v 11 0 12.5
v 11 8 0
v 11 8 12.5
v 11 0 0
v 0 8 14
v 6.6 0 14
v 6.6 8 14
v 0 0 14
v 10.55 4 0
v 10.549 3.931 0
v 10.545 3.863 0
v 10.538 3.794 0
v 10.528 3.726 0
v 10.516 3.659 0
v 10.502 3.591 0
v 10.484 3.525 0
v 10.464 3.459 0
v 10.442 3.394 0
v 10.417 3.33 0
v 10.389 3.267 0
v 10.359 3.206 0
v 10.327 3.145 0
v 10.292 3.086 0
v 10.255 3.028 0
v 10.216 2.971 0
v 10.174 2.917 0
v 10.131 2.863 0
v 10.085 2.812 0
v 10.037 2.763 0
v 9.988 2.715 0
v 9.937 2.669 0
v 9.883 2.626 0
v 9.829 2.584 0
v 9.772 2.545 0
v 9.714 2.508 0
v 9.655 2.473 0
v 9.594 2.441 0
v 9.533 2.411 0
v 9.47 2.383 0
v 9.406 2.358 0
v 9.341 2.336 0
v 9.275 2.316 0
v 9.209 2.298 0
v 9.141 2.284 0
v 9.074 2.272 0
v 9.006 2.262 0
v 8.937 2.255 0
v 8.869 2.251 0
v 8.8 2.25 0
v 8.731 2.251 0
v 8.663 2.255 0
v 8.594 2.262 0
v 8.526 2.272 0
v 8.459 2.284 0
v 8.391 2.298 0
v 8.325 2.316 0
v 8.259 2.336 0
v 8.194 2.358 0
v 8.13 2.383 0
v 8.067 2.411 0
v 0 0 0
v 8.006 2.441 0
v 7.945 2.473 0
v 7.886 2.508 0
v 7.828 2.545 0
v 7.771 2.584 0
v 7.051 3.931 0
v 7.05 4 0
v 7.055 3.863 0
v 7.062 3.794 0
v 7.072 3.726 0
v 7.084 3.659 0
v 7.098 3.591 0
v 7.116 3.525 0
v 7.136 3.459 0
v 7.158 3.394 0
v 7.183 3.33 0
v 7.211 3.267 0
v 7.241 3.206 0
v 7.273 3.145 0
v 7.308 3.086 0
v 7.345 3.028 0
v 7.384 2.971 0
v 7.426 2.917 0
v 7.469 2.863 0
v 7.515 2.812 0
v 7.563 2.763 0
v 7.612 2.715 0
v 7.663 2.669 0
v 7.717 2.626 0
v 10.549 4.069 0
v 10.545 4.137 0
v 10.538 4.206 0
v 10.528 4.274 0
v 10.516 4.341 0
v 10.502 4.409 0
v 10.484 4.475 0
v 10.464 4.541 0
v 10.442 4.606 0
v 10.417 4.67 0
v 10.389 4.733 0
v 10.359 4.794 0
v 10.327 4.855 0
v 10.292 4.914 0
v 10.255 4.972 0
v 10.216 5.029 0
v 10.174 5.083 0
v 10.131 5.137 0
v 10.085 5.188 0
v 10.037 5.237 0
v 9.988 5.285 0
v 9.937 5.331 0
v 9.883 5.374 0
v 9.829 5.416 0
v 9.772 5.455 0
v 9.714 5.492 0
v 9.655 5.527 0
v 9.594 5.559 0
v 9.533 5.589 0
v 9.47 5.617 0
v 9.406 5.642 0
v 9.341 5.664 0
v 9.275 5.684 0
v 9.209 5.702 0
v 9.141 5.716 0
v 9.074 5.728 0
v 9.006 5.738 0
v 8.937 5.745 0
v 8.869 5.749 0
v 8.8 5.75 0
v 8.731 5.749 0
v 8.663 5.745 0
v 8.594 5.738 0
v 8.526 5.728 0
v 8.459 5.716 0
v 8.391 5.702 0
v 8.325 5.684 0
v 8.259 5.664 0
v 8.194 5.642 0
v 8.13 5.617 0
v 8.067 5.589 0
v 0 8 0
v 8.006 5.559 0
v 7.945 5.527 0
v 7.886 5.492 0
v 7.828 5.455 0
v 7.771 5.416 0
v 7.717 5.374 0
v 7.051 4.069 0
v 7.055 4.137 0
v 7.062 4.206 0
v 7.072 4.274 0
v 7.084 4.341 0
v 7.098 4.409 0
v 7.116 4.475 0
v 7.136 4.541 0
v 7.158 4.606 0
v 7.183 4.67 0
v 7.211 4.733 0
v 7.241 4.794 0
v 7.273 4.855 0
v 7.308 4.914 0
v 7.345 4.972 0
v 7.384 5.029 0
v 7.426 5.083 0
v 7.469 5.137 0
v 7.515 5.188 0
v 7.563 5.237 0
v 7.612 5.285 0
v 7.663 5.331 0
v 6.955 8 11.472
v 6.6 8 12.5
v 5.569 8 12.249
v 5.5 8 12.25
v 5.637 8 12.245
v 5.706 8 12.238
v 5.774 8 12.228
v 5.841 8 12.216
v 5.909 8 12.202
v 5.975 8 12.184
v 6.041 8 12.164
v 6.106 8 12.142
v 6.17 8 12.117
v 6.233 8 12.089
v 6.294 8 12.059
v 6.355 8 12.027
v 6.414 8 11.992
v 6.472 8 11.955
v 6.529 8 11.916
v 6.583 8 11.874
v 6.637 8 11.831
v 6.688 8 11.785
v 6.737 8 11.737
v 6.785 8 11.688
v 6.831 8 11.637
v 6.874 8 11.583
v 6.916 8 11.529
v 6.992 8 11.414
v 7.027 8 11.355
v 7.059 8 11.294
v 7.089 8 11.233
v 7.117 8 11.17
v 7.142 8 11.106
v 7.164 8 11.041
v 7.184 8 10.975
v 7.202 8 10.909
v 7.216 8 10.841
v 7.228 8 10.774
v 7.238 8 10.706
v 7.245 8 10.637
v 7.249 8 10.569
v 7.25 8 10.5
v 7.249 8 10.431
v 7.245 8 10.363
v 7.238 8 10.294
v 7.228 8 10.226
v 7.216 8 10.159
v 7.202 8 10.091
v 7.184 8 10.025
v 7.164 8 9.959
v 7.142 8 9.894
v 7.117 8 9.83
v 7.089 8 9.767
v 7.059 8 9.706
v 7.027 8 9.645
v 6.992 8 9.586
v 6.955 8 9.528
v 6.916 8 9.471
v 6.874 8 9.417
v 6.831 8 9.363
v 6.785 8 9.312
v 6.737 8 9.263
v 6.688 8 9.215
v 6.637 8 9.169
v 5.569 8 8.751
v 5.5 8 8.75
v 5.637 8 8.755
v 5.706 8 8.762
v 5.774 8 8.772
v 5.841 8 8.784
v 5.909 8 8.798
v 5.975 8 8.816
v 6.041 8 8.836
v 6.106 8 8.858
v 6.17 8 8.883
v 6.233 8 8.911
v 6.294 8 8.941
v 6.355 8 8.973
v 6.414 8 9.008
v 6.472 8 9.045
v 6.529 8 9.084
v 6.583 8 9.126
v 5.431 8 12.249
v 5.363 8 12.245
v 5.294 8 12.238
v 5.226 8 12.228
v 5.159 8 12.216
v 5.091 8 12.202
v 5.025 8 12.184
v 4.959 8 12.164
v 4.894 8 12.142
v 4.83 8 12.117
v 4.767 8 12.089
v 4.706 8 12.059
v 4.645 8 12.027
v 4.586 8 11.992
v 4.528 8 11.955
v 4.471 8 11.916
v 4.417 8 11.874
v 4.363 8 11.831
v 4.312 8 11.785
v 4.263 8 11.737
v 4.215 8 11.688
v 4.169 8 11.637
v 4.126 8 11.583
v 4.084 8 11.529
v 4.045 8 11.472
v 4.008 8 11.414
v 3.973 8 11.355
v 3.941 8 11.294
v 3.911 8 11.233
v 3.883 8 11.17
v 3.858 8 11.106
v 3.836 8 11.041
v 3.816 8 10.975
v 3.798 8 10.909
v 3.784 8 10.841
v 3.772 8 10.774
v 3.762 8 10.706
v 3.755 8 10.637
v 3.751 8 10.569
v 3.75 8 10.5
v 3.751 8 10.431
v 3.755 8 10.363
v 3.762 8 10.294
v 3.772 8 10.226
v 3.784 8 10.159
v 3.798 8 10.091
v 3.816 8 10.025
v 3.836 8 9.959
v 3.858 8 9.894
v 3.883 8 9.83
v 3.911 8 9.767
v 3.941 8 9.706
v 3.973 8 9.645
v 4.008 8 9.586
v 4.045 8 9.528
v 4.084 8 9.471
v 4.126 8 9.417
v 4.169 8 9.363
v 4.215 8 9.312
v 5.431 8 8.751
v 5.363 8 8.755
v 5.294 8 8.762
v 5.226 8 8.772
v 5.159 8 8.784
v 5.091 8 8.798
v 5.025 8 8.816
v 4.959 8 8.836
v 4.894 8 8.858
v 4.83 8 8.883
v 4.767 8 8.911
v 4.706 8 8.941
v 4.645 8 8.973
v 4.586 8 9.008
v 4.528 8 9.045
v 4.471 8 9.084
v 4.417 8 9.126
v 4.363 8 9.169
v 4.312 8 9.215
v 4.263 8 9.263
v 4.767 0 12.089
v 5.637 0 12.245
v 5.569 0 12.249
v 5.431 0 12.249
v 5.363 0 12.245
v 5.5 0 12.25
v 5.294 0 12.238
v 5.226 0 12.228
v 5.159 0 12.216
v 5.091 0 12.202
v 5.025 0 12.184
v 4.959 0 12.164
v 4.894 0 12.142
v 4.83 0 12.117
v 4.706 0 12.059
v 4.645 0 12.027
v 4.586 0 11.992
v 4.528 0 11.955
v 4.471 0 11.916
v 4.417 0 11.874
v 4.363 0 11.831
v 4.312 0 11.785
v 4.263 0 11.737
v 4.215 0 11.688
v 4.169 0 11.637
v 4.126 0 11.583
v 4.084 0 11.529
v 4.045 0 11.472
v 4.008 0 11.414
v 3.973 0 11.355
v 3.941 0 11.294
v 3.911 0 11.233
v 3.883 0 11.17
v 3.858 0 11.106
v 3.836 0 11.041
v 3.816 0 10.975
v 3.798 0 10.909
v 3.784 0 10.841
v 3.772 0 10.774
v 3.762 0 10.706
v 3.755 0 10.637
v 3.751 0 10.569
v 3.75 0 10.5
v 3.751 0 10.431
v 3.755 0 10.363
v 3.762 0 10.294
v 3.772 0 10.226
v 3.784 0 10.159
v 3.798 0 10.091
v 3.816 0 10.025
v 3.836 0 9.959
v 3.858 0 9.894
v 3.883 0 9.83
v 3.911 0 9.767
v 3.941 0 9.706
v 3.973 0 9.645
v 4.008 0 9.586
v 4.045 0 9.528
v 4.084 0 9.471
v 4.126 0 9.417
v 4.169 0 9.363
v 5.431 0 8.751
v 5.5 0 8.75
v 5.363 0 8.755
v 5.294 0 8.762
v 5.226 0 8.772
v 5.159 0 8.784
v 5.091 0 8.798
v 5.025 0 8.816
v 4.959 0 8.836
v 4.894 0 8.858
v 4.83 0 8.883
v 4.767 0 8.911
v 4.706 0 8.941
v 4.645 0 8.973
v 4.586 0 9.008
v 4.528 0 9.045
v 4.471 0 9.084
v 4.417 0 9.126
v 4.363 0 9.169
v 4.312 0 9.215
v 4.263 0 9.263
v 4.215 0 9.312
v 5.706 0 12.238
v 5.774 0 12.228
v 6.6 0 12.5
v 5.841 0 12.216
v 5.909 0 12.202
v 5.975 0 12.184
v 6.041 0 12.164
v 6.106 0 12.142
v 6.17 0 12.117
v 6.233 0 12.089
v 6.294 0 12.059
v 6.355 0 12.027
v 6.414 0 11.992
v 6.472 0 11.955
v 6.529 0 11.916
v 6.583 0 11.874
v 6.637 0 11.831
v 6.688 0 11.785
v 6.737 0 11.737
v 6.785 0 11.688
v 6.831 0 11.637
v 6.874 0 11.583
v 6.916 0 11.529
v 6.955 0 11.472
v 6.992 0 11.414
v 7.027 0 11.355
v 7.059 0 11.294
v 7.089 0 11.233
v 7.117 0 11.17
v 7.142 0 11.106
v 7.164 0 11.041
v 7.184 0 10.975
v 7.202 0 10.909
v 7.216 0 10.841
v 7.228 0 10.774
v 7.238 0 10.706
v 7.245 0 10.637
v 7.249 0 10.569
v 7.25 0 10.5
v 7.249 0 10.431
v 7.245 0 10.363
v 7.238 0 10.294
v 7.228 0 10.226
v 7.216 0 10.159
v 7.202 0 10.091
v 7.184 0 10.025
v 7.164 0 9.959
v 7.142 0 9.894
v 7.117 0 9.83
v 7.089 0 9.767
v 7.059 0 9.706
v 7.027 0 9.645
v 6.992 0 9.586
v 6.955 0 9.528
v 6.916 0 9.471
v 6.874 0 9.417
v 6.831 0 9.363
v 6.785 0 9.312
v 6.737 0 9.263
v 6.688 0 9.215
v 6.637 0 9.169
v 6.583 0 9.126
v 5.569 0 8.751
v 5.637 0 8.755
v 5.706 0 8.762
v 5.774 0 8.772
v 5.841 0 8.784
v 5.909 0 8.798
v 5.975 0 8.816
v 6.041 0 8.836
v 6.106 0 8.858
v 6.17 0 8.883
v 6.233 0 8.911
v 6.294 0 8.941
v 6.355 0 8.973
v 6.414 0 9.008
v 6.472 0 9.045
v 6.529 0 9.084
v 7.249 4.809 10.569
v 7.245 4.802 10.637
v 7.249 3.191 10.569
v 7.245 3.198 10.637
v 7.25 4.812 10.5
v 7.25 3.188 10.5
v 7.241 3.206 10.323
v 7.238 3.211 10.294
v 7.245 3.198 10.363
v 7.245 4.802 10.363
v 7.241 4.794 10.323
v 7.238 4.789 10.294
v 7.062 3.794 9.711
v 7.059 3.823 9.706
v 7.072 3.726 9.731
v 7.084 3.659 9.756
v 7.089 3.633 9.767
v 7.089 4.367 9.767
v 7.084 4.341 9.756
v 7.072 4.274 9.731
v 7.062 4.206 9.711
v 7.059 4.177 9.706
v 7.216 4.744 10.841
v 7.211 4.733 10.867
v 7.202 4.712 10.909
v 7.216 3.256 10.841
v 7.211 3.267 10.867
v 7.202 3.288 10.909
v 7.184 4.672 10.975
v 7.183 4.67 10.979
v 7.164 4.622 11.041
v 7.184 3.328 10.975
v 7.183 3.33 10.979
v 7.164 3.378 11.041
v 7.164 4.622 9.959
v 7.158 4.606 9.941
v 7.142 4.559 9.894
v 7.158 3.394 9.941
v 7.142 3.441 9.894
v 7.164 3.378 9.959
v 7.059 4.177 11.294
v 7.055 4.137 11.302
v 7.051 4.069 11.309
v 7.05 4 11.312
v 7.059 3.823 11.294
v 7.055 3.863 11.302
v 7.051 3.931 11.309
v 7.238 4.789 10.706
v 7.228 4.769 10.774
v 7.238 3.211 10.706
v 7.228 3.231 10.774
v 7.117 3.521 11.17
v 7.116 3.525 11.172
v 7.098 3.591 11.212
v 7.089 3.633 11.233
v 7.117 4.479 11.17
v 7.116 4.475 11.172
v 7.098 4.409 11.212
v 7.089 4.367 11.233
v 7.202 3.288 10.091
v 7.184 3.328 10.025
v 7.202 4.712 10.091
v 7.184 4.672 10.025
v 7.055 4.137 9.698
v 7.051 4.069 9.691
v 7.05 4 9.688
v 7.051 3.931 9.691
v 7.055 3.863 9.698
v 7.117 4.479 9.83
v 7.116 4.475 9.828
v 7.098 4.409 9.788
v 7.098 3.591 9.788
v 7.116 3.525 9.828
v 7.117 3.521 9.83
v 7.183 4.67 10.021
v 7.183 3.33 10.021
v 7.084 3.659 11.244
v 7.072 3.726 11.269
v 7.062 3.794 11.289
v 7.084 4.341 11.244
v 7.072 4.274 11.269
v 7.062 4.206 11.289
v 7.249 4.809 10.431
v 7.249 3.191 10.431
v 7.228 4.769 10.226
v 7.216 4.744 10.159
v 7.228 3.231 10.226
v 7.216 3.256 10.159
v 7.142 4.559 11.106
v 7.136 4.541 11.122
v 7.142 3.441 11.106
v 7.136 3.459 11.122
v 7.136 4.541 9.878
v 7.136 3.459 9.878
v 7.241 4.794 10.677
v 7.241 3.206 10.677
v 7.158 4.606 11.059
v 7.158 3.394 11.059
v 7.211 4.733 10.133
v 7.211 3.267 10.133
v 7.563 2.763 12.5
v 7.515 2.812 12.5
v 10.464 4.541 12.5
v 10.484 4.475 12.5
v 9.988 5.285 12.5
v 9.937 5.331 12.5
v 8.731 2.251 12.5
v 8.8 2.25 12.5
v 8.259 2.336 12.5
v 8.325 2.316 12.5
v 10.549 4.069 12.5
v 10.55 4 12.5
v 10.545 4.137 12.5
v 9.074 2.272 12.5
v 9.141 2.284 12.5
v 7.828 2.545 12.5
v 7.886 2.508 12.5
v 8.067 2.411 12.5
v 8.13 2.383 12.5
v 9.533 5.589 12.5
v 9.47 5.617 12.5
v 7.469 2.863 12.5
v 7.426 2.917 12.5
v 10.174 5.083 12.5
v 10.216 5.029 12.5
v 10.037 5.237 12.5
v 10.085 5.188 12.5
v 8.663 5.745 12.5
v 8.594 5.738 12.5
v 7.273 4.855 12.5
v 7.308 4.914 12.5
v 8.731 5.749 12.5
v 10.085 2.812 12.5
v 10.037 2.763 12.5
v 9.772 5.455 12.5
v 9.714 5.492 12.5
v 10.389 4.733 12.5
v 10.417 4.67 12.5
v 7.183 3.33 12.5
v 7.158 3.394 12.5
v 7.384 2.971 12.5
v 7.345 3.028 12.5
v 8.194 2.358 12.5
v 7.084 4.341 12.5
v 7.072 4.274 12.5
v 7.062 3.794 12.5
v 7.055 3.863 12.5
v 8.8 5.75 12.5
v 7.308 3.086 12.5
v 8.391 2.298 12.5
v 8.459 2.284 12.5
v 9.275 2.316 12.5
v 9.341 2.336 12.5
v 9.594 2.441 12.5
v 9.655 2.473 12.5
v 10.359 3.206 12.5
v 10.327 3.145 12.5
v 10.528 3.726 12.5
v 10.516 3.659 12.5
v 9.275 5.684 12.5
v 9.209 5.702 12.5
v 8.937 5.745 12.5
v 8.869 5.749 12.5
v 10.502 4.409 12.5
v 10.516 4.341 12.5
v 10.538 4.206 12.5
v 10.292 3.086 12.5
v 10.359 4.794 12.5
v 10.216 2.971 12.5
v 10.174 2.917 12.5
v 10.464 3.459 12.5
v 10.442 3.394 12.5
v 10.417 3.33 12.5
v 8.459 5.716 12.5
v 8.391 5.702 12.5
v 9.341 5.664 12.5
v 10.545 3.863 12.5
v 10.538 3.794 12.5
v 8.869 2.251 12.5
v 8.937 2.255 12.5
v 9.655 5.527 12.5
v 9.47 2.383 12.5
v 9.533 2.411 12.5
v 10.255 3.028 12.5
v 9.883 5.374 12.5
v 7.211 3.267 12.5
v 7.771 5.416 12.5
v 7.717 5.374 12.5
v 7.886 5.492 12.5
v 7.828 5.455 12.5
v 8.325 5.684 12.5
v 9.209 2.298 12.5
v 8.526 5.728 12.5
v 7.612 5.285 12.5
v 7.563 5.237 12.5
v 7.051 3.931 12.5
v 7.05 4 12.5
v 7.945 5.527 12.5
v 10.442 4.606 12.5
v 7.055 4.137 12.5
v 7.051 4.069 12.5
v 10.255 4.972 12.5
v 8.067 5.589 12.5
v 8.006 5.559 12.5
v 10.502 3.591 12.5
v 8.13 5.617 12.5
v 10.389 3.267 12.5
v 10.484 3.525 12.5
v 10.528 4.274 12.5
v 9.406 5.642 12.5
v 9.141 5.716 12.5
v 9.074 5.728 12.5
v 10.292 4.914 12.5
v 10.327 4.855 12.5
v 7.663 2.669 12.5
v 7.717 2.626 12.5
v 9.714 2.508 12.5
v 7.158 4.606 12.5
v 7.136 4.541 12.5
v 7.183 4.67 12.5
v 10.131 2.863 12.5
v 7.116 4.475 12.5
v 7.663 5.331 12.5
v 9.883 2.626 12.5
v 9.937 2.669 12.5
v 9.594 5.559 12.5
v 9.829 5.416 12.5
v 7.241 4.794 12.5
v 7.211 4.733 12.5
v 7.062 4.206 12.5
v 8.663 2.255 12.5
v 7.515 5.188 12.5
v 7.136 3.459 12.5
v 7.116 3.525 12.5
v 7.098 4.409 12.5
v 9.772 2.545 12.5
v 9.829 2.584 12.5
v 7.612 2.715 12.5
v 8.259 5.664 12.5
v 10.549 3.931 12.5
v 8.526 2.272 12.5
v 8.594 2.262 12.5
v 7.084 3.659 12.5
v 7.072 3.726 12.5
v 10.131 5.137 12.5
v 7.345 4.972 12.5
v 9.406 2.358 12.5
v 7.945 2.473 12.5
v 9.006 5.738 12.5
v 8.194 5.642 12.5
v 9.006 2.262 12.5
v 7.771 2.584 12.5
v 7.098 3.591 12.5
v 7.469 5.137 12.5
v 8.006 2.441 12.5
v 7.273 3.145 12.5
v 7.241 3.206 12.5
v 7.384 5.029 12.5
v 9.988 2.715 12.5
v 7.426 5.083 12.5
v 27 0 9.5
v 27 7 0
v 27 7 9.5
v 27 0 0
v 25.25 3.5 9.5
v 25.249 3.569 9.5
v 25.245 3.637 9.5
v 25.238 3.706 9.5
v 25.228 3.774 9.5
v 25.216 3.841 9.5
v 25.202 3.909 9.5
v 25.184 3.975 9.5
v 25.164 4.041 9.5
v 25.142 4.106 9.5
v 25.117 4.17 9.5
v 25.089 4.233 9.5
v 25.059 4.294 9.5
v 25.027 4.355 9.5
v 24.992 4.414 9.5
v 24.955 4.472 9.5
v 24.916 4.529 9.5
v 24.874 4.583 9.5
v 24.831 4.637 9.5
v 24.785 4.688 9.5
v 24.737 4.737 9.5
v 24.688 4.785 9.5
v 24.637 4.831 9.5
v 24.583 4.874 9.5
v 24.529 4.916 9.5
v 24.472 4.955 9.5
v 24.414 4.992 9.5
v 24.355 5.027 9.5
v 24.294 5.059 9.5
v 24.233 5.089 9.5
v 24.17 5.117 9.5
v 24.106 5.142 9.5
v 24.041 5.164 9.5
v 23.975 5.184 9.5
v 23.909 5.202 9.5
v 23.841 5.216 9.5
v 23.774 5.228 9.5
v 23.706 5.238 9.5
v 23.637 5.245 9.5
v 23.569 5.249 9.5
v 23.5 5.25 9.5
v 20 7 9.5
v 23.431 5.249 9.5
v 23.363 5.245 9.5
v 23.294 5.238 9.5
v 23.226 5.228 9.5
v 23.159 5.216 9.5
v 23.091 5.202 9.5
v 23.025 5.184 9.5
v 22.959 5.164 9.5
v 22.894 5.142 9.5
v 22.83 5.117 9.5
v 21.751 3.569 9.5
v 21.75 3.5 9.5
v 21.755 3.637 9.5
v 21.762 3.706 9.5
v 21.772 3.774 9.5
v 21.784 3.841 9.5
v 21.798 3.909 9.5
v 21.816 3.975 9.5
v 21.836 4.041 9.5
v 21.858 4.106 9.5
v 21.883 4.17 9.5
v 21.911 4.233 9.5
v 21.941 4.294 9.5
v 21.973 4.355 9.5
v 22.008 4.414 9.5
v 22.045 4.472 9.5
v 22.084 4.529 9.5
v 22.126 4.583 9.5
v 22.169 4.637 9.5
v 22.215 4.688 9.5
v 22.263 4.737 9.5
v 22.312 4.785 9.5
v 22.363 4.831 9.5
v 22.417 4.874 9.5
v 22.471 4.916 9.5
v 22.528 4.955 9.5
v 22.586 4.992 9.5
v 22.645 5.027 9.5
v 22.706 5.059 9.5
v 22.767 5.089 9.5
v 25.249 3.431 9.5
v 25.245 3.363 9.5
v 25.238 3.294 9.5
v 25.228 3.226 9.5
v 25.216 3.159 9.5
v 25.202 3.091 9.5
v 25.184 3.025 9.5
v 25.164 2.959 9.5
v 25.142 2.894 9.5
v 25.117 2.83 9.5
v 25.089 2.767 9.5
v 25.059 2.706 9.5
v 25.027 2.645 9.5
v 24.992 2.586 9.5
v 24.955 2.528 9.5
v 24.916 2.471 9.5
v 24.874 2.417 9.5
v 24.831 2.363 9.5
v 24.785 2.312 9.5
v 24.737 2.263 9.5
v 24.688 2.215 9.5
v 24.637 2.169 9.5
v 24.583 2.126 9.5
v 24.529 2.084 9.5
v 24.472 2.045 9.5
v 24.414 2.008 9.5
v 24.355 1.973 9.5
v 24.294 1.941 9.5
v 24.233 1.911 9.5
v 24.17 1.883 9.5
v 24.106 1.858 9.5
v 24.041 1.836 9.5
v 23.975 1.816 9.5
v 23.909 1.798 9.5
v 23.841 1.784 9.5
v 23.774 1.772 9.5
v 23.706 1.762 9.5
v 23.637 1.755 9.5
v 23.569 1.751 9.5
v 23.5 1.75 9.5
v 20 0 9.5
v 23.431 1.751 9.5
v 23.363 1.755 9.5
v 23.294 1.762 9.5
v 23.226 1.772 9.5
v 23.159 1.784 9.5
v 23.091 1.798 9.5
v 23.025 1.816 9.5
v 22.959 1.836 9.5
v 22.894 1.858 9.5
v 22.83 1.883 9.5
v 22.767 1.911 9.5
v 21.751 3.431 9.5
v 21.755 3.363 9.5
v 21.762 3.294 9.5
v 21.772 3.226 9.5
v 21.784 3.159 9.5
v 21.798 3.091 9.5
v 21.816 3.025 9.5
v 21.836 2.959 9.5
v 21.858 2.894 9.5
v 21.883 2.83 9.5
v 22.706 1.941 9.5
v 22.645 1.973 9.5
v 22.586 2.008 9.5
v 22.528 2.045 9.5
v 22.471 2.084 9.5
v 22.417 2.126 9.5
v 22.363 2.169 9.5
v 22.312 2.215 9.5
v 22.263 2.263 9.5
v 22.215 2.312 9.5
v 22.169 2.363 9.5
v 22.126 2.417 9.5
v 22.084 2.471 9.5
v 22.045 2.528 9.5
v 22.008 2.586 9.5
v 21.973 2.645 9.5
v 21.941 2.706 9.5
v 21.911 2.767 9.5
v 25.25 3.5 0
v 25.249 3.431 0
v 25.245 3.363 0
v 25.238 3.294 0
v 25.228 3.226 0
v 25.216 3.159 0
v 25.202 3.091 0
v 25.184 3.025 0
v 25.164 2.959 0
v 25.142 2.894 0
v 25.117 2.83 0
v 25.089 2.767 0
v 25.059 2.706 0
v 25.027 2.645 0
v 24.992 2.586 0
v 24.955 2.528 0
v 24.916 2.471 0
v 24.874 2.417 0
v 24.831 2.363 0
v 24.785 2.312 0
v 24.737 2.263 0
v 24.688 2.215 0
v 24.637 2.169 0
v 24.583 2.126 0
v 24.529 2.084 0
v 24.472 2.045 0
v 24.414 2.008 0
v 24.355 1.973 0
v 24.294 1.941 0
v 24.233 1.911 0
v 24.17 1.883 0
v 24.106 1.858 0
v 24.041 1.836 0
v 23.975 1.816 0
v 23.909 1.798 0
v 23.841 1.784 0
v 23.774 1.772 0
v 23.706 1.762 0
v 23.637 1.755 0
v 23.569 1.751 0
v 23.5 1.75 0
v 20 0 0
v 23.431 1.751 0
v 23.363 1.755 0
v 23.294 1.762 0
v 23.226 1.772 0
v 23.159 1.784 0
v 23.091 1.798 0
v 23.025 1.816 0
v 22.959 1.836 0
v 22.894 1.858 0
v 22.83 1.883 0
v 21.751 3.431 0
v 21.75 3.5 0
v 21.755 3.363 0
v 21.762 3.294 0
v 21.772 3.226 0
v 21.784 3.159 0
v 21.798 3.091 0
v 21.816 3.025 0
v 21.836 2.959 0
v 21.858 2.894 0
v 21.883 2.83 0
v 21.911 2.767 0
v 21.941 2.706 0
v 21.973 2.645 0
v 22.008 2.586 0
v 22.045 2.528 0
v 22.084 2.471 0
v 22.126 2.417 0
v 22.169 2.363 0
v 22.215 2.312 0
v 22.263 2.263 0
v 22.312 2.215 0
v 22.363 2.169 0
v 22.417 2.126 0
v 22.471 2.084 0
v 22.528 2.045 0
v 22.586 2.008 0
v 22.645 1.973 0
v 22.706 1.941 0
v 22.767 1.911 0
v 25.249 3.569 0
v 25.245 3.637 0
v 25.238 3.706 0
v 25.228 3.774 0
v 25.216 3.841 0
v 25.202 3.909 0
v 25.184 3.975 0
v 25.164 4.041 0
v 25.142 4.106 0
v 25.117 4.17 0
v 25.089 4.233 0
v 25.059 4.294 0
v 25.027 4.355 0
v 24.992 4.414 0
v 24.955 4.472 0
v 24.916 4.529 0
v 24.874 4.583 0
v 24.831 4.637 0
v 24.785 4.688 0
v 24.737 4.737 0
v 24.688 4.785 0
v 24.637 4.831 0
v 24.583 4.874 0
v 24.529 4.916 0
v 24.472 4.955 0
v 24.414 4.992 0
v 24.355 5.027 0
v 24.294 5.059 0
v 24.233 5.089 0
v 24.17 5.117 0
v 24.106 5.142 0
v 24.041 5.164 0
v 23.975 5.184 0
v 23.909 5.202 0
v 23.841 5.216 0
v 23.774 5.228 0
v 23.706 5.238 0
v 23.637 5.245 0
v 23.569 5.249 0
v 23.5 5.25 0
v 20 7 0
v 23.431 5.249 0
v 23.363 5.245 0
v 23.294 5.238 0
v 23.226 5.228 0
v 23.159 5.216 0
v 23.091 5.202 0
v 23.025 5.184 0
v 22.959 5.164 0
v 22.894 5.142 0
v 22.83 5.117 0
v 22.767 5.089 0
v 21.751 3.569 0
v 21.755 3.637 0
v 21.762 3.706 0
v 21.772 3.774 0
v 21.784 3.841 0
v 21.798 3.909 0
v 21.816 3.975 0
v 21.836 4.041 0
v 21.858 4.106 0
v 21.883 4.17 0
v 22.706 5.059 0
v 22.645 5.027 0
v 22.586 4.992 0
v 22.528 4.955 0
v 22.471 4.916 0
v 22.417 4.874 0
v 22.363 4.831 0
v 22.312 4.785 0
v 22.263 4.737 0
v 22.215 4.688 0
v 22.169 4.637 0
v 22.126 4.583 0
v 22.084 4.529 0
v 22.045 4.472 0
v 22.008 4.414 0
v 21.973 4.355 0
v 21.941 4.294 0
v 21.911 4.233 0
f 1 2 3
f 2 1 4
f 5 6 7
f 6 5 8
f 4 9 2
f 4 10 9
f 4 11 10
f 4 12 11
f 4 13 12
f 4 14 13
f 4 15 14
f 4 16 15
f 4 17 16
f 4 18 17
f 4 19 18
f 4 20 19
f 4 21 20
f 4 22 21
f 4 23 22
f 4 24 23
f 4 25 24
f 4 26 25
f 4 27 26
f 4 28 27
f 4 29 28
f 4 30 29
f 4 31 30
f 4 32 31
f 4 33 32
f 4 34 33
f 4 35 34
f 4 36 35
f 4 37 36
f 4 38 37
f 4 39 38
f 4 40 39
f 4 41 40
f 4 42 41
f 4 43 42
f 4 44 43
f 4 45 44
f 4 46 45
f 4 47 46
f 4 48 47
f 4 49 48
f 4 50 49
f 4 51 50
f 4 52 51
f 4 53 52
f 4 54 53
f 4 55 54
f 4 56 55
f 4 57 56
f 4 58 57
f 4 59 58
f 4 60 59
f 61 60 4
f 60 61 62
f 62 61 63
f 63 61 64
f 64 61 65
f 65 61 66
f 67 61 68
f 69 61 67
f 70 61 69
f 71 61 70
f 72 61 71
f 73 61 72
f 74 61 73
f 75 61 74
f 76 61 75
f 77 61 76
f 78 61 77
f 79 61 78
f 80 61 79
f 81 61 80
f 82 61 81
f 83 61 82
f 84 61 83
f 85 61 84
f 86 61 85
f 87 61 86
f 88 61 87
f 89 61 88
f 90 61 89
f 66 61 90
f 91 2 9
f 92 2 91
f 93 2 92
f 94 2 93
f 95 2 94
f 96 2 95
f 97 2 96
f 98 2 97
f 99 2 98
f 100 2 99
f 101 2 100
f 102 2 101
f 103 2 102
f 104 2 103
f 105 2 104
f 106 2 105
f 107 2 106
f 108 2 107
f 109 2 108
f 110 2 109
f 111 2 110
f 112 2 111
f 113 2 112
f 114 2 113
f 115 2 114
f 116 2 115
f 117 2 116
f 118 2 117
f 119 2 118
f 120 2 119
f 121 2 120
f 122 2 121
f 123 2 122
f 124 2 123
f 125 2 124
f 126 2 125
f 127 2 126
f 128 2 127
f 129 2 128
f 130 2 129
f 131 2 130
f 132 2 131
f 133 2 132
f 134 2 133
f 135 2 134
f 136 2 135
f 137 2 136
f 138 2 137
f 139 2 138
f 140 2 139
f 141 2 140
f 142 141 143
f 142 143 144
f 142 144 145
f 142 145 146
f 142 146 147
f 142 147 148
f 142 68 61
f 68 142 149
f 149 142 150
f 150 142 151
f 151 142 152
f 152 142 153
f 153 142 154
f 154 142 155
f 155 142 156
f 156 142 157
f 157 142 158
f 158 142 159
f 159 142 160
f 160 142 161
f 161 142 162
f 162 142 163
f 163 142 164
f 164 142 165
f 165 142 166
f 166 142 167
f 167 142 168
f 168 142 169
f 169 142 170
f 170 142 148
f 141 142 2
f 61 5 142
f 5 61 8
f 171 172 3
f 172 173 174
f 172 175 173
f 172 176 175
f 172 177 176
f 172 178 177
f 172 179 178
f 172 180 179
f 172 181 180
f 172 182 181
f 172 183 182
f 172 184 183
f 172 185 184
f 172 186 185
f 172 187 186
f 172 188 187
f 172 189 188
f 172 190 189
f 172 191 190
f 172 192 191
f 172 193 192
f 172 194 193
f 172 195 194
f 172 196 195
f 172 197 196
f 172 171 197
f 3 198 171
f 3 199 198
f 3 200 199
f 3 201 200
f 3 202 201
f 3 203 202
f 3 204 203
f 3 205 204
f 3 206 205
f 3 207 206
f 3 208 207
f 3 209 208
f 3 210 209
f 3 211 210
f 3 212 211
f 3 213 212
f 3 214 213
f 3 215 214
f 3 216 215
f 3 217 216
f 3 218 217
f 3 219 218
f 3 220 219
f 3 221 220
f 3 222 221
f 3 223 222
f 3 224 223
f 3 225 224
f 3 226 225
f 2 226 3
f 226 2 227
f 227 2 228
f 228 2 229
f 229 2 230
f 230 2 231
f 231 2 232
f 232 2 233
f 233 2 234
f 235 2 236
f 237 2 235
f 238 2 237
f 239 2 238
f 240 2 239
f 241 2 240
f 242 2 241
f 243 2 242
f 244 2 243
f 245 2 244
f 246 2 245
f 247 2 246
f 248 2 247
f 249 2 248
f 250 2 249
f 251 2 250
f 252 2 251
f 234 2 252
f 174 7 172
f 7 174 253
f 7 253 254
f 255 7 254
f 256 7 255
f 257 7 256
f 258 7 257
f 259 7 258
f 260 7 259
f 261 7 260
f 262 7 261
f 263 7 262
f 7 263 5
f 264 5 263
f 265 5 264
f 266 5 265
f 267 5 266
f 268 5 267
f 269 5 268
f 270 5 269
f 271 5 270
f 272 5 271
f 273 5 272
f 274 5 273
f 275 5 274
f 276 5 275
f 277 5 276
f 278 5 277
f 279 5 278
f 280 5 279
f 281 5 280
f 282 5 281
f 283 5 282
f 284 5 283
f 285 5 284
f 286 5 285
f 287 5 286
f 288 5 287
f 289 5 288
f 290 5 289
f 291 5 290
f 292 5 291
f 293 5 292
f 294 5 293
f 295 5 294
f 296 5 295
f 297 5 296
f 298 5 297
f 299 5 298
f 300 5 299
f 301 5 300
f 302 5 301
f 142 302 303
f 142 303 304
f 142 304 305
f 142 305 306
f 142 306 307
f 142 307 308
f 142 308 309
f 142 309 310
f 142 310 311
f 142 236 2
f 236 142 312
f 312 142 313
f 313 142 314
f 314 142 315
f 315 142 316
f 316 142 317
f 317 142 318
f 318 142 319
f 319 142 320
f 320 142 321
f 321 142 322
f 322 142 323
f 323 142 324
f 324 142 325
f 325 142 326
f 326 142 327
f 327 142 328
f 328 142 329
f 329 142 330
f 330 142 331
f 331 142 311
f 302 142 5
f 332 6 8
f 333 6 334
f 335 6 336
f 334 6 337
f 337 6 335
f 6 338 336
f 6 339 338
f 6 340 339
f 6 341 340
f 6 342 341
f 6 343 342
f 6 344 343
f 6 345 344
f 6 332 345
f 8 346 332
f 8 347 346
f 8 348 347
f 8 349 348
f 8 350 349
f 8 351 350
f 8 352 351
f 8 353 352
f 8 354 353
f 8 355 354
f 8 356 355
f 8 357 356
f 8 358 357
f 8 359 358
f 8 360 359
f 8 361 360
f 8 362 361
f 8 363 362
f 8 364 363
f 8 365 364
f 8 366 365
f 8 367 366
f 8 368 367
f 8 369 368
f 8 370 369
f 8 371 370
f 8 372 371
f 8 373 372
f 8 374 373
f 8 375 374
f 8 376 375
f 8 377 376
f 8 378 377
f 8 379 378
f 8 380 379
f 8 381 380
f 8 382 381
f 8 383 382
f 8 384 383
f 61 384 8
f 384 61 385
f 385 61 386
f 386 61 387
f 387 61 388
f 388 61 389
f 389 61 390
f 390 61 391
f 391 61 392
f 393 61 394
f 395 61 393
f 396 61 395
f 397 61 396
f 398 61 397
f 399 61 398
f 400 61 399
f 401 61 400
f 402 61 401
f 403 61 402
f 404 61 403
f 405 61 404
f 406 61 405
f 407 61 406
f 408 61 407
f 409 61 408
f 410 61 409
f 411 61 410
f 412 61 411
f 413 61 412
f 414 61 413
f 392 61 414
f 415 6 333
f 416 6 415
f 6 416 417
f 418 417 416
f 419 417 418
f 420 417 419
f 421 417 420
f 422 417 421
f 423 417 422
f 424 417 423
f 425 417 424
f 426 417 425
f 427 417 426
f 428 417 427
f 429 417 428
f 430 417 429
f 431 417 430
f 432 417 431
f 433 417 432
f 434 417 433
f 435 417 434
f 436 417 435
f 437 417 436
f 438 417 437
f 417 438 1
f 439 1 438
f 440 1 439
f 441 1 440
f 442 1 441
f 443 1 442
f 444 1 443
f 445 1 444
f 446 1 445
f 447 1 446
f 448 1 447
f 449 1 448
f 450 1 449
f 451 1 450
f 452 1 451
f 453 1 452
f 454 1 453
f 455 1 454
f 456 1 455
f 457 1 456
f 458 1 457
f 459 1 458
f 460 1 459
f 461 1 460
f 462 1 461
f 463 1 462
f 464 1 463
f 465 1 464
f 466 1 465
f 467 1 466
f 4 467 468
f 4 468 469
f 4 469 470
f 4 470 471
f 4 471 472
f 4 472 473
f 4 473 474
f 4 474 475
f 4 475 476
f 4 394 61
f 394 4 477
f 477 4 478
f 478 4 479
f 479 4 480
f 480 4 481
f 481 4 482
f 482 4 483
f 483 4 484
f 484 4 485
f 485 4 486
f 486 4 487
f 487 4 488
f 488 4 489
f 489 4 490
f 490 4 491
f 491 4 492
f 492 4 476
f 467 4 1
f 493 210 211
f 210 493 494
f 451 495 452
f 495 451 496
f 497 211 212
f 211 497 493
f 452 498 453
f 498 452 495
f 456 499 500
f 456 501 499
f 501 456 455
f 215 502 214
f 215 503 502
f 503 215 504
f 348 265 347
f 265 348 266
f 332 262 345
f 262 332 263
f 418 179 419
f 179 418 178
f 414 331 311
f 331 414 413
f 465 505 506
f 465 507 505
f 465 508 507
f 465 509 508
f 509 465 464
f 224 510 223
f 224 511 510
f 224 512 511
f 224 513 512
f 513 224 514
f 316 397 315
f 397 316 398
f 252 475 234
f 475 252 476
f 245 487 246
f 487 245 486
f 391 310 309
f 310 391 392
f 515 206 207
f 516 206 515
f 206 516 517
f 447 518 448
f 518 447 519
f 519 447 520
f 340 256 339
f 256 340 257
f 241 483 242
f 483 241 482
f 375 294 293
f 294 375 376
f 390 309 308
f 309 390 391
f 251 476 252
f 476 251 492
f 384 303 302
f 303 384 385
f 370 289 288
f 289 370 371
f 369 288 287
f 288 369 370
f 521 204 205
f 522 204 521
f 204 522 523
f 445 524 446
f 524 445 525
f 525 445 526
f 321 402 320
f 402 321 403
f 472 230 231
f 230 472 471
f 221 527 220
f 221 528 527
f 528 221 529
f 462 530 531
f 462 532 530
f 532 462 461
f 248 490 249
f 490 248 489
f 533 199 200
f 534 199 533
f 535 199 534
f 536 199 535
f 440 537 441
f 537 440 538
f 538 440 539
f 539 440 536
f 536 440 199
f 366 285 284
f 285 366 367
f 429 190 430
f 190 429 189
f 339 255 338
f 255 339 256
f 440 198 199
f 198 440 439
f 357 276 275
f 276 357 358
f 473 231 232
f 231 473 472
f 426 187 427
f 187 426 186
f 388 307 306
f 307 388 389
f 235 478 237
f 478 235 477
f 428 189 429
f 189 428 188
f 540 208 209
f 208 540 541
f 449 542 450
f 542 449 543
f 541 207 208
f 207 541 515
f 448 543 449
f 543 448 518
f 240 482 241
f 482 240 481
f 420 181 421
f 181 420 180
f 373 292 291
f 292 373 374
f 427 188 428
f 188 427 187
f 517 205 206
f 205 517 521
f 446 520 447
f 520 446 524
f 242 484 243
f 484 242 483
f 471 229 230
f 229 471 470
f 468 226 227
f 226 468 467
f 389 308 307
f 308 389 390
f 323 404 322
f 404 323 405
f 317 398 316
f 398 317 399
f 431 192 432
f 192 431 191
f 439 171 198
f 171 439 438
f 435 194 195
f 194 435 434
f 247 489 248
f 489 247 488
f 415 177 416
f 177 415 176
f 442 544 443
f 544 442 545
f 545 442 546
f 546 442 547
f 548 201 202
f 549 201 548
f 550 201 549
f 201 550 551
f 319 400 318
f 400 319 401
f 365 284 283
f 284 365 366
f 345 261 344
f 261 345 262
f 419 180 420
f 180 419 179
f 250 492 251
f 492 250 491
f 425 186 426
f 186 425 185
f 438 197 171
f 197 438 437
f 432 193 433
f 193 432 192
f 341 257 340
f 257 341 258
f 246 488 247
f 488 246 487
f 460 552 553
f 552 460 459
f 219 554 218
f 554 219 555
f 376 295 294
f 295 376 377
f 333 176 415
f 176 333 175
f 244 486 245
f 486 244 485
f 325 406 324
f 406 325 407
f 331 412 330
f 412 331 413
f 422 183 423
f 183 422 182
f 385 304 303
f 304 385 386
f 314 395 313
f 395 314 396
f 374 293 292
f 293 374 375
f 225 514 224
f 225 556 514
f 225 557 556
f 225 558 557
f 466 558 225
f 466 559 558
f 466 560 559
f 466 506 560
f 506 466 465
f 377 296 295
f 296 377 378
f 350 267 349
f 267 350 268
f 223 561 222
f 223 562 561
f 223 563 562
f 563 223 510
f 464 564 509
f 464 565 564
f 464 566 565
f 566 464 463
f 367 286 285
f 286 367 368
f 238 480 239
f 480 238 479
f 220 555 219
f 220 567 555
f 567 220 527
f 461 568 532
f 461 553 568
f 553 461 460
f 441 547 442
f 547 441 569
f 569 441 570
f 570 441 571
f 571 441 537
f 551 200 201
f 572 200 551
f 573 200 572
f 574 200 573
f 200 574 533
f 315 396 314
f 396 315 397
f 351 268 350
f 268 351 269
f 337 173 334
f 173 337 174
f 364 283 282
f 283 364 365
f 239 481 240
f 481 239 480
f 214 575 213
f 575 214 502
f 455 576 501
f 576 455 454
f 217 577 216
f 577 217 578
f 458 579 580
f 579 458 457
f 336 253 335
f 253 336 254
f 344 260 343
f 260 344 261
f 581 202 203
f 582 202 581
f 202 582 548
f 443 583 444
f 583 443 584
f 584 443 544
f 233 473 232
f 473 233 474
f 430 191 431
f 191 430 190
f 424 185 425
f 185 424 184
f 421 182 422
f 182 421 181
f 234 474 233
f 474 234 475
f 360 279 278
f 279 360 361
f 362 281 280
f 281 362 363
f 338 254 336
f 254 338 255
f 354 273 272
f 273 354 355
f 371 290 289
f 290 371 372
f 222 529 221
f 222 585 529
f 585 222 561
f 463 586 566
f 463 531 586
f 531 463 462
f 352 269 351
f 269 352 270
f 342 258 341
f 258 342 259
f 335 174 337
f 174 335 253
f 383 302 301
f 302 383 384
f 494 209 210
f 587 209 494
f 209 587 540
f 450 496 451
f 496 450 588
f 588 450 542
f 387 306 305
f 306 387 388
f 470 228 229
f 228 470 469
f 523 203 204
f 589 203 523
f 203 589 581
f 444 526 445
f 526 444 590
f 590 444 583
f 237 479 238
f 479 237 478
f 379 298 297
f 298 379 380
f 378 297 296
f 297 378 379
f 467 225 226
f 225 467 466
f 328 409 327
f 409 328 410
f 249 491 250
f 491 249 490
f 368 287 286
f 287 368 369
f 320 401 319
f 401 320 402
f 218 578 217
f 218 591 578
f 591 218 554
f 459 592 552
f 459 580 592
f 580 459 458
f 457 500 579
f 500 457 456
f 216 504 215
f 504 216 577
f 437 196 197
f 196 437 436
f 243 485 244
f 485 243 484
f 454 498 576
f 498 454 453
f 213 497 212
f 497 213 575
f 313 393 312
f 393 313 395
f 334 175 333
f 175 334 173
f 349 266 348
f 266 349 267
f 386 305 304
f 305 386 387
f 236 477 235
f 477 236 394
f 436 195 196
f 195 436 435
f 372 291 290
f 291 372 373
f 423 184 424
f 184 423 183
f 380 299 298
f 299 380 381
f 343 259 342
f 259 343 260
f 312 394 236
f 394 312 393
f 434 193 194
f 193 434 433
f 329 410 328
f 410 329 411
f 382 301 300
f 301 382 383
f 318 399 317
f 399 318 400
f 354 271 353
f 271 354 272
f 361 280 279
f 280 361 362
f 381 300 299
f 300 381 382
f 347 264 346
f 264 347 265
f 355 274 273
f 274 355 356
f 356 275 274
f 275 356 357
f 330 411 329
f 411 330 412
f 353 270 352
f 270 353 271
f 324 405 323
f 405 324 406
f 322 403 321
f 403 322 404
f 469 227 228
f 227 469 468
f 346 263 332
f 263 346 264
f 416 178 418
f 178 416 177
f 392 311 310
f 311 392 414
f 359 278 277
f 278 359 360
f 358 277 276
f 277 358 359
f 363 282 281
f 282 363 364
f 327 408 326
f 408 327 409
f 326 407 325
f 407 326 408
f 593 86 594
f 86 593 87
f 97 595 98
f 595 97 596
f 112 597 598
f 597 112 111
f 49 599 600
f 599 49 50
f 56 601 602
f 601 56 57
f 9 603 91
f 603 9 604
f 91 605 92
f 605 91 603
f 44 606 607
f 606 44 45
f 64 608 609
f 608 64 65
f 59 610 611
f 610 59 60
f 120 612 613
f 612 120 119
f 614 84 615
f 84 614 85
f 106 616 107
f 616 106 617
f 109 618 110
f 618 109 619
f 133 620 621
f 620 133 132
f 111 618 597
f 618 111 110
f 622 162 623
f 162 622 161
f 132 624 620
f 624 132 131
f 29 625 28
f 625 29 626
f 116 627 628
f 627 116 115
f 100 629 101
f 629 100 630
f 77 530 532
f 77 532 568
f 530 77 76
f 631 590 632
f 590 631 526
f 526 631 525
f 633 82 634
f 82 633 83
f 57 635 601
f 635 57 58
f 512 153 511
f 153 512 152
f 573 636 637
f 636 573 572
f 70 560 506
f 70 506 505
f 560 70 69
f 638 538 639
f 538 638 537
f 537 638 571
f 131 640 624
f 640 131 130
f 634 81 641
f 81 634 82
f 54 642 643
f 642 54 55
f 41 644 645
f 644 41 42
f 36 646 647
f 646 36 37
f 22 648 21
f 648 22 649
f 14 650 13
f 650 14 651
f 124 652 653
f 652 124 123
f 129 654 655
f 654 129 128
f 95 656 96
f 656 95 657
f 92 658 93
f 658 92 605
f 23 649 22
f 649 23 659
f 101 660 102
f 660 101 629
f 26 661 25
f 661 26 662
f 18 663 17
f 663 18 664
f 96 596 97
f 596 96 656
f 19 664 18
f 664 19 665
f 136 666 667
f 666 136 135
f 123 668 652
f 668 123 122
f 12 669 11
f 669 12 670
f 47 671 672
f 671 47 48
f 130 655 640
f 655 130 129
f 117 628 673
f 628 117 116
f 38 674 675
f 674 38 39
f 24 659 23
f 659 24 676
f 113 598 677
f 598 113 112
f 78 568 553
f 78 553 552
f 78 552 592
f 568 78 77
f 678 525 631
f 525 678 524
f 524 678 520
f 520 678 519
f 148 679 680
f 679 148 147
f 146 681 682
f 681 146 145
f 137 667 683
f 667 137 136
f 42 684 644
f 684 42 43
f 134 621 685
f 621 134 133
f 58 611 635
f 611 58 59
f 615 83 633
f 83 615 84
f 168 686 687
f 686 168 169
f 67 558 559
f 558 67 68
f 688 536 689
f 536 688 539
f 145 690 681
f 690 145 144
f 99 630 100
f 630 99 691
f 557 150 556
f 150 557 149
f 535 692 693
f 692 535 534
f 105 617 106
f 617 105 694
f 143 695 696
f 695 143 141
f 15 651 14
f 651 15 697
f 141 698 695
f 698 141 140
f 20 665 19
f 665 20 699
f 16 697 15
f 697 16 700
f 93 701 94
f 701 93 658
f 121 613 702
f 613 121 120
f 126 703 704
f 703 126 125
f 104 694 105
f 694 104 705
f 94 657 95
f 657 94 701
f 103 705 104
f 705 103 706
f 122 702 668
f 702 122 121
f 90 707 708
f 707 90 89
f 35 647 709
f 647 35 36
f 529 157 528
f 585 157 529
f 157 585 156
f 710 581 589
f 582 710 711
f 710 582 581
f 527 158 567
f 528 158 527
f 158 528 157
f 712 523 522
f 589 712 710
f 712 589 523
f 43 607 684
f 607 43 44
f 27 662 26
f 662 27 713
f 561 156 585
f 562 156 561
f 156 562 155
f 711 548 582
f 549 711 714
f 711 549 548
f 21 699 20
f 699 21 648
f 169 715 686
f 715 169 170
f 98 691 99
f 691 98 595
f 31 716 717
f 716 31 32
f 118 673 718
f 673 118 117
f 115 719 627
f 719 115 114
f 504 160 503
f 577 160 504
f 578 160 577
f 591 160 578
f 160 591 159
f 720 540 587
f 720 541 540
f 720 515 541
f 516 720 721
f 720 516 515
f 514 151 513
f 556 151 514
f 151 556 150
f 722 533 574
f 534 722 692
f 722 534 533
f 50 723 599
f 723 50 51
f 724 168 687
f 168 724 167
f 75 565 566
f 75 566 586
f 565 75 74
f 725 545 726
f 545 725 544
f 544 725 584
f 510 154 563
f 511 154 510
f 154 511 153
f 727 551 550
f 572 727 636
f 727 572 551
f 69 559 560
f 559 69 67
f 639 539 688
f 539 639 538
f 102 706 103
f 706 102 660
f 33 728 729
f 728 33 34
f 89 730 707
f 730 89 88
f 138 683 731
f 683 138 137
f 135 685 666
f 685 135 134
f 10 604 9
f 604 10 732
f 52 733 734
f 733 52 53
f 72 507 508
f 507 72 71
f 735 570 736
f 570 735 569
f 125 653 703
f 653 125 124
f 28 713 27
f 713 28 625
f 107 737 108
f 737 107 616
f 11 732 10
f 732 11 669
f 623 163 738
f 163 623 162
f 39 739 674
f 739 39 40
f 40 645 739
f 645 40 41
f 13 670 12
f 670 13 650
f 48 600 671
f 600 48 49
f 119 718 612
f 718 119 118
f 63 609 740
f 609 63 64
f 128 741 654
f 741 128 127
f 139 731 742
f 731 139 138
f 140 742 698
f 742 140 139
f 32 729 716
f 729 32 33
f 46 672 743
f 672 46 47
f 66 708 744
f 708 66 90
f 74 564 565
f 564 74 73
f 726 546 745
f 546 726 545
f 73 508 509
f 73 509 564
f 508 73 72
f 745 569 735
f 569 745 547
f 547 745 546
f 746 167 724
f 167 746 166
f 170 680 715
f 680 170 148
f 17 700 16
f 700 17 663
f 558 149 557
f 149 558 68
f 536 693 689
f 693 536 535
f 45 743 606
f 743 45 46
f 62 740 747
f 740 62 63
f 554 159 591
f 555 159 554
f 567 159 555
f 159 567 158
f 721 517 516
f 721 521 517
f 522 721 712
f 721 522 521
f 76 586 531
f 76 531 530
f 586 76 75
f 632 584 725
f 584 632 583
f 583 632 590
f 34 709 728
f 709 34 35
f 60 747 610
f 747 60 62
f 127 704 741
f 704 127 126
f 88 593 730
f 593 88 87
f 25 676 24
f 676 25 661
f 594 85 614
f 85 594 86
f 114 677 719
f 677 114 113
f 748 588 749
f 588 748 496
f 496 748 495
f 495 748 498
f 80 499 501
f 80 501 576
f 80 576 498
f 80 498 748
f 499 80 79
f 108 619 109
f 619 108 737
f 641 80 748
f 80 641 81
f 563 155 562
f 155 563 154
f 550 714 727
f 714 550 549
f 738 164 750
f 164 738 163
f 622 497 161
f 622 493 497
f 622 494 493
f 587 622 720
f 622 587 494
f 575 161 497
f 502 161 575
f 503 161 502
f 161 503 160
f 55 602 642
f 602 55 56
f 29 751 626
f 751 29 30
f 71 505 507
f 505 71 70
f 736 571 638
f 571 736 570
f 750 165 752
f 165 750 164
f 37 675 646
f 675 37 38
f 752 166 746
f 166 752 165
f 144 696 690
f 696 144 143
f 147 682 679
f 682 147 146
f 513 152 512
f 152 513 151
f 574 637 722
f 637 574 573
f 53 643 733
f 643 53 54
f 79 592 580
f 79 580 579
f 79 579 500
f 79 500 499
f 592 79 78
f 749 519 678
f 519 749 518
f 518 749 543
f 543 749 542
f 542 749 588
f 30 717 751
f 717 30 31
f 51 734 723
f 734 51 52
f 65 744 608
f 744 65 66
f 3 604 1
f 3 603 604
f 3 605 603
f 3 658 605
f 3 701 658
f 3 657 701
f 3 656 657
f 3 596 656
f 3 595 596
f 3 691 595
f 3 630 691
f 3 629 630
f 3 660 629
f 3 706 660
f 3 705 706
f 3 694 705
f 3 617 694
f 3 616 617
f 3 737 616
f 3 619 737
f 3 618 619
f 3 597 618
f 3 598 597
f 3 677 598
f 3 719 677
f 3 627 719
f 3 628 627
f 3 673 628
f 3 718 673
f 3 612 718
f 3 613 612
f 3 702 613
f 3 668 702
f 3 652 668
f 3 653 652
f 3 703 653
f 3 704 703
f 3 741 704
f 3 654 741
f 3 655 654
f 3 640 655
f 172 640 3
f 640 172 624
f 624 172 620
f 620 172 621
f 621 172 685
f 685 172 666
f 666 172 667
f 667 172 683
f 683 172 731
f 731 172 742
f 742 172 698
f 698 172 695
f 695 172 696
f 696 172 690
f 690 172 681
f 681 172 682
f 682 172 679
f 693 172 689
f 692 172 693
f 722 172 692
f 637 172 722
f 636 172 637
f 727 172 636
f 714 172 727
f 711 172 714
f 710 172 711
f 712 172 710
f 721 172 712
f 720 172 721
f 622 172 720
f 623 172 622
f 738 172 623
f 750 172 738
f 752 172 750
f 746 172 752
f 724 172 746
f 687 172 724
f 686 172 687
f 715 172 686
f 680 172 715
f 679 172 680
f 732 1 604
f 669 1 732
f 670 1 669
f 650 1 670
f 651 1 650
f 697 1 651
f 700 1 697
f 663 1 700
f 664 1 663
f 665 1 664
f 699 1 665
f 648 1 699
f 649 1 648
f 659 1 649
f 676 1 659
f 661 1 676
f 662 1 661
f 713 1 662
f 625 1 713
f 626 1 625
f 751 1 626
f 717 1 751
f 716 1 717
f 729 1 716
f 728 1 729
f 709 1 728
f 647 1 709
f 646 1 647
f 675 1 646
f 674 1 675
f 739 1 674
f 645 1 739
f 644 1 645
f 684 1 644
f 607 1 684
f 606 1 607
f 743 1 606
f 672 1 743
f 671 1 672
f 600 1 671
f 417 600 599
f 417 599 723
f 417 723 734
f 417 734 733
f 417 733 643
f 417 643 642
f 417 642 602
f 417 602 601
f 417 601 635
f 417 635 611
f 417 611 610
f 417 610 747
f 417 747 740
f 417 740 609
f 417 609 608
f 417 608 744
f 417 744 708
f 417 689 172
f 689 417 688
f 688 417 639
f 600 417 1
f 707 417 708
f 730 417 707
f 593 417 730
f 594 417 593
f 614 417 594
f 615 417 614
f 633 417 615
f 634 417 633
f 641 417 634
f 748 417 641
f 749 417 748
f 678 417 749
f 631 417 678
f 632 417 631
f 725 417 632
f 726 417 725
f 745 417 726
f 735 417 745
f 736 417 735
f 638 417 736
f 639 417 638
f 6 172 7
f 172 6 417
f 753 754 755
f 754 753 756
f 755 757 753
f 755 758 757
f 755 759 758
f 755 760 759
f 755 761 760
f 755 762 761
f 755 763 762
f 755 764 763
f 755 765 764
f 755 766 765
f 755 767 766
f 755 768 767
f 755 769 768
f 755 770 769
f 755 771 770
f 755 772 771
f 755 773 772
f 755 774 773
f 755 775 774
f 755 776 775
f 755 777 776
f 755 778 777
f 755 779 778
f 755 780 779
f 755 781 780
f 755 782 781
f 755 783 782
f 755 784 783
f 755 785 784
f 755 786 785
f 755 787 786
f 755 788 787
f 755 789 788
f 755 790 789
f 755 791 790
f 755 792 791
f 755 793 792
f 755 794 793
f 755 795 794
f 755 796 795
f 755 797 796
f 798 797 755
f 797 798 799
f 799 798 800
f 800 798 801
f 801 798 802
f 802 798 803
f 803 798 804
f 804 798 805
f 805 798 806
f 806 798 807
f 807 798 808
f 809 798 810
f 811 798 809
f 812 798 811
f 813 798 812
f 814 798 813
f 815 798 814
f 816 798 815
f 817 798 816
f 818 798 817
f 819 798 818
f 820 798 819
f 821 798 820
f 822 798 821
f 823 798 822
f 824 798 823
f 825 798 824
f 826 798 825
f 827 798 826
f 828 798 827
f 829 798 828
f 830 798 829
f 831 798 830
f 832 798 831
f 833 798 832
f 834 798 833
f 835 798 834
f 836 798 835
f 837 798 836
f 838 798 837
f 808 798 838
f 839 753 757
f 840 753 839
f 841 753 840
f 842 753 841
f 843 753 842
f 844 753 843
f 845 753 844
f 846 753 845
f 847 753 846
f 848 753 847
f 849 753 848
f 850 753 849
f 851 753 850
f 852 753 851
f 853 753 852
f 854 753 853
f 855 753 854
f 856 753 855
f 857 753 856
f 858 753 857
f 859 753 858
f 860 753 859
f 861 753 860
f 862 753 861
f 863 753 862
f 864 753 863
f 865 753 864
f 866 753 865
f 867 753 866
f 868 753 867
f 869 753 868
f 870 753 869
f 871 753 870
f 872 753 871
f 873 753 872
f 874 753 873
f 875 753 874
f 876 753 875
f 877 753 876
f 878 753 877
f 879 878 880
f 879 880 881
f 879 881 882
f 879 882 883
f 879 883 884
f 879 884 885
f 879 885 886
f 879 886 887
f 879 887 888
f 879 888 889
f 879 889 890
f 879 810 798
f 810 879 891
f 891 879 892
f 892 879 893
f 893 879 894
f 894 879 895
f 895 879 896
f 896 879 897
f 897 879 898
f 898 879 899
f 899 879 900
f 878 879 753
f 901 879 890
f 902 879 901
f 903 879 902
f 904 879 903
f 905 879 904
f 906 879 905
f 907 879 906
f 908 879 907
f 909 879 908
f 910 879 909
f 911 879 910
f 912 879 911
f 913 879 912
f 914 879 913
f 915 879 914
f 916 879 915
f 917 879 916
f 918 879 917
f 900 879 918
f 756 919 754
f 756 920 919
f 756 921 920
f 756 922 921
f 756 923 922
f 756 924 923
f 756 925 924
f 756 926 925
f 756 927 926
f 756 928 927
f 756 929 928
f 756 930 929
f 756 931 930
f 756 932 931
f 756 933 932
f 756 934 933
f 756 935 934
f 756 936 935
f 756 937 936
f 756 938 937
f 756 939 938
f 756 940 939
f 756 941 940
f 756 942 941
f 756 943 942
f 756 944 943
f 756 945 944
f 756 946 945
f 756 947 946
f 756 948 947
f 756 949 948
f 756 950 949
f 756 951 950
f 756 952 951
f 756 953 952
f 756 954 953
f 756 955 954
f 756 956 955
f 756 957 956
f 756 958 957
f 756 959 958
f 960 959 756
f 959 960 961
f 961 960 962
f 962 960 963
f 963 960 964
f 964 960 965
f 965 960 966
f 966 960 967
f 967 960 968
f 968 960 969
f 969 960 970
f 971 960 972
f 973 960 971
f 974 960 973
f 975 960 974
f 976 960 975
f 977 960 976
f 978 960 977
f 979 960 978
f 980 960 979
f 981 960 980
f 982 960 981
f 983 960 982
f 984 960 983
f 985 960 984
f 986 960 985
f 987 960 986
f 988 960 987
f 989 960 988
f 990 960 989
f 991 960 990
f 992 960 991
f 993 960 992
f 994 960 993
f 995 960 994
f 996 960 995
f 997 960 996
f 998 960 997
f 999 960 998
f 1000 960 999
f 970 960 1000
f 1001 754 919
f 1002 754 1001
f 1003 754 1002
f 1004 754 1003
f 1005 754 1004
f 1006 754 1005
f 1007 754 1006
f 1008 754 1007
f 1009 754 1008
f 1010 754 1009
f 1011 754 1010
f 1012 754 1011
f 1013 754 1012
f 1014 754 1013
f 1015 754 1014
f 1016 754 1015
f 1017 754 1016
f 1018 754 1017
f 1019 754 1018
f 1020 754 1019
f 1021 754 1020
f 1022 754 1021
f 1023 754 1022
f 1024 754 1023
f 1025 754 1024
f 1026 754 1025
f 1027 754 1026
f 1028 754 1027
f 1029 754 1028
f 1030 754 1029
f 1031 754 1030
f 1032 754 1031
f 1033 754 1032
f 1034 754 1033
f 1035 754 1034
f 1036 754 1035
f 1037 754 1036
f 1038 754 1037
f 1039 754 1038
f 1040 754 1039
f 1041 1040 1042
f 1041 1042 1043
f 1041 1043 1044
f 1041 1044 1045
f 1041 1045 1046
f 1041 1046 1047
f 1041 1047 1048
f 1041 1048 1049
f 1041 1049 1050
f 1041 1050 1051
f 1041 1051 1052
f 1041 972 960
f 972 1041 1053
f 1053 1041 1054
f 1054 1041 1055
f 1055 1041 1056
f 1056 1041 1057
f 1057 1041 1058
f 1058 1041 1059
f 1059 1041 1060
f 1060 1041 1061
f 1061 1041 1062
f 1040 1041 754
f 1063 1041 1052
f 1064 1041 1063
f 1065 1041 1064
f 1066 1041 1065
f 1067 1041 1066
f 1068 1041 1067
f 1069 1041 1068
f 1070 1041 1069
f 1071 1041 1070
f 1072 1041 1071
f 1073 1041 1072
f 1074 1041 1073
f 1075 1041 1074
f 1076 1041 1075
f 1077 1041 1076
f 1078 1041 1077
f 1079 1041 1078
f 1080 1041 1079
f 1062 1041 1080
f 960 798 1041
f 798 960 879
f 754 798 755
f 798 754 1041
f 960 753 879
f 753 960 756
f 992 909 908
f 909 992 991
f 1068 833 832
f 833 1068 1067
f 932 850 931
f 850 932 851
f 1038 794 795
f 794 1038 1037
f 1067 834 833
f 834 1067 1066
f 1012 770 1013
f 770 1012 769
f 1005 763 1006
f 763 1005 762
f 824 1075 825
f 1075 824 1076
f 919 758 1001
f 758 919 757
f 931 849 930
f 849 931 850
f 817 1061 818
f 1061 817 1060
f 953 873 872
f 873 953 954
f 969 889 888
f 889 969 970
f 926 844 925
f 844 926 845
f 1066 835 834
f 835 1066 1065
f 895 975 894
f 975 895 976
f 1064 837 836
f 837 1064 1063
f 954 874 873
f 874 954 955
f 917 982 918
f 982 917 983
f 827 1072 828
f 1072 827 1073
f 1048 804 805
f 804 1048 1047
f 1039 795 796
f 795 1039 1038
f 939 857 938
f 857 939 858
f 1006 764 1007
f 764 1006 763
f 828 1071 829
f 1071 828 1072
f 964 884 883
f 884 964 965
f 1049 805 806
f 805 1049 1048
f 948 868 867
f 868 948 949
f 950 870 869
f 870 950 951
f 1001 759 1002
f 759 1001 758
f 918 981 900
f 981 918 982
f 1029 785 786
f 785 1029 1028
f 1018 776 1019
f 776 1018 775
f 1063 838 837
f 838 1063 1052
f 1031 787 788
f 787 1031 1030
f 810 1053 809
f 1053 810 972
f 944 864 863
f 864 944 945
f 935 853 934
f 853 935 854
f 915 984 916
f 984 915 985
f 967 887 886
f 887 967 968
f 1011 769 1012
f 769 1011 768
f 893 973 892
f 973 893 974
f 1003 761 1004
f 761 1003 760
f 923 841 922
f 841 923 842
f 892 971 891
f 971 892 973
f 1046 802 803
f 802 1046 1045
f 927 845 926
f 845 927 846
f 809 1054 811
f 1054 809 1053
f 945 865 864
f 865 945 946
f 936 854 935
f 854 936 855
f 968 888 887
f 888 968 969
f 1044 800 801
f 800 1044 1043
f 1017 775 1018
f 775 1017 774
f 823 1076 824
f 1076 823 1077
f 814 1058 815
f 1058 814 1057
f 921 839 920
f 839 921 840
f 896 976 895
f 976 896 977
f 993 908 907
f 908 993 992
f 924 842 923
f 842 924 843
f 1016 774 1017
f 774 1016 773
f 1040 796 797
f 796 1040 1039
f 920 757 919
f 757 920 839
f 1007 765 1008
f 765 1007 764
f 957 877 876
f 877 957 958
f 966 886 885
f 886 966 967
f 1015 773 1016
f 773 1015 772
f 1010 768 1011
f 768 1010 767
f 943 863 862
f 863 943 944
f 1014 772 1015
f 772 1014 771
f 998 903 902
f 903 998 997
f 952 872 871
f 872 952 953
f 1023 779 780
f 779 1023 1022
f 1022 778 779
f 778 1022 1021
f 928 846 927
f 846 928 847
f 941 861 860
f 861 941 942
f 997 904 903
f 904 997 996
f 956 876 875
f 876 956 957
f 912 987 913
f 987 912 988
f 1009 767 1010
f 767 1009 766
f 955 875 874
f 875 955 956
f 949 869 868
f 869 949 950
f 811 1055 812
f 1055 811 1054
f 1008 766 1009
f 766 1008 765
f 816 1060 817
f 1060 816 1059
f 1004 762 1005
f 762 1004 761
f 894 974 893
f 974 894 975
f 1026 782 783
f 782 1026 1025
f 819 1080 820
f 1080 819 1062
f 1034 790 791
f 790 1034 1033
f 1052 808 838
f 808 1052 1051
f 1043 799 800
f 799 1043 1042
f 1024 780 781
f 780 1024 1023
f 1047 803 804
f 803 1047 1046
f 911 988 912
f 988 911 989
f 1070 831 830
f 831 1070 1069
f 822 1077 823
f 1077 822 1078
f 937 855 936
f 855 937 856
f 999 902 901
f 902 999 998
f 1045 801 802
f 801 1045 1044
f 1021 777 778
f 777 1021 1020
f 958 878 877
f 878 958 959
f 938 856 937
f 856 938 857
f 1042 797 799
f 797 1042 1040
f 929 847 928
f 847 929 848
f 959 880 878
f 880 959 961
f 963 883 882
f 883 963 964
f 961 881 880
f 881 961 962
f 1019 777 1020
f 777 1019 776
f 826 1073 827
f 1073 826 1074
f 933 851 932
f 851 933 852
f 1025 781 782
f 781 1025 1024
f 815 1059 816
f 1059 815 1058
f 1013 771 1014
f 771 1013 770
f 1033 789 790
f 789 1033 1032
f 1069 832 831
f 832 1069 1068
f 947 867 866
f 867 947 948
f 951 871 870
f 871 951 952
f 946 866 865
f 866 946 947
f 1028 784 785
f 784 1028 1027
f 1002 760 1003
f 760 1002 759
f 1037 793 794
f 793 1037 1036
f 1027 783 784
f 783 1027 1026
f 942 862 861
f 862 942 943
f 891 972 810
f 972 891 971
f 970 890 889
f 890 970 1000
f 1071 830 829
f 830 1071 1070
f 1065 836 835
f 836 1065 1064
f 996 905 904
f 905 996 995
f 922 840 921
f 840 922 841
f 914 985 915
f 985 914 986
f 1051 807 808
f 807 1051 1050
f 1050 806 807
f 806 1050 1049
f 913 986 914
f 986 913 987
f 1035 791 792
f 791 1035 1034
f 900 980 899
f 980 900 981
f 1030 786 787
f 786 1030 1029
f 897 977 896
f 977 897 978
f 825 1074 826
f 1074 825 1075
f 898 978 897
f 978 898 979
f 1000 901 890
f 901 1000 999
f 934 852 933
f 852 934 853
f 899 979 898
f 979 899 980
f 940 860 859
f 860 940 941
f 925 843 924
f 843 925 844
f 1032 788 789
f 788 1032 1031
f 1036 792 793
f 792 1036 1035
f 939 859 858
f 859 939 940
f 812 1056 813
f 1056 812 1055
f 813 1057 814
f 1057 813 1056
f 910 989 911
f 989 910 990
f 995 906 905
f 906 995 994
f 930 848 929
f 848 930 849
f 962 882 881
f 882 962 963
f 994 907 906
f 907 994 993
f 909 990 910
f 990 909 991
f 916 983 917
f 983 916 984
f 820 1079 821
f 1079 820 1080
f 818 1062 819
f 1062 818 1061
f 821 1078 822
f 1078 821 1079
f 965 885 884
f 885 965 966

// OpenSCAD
$fn = 160;




module houderVoorPcb() {
    xdim = 11;
    ydim = 8;
    zdim = 14;
    difference() {
        cube([xdim, ydim, zdim]);
        translate([xdim / 2, 8, 10.5])rotate([90, 0, 0]) cylinder(8, 3.5 / 2, 3.5 / 2);
        translate([4 * xdim / 5, 8/2, 0]) cylinder(14, 3.5 / 2, 3.5 / 2);
        uitsparingx = xdim * 2 / 5;
        transx = xdim * 3 / 5;
        #translate([transx, 0, zdim - 1.5]) cube([uitsparingx, ydim, 1.5]);
    }
}

module afstandsBlokje() {
    xdim = 7;
    ydim = 7;
    zdim = 9.5;
    difference() {
        cube([xdim, ydim, zdim]);
        #translate([xdim / 2, ydim / 2, 0]) cylinder(zdim, 3.5 / 2, 3.5 / 2);
    }
}

module alles(a = 1, b = 1) {
    if (a == 1) {
        houderVoorPcb();
    }
    if (b == 1) {
        translate([20, 0, 0]) afstandsBlokje();
    }
}

alles(1, 1);
        
